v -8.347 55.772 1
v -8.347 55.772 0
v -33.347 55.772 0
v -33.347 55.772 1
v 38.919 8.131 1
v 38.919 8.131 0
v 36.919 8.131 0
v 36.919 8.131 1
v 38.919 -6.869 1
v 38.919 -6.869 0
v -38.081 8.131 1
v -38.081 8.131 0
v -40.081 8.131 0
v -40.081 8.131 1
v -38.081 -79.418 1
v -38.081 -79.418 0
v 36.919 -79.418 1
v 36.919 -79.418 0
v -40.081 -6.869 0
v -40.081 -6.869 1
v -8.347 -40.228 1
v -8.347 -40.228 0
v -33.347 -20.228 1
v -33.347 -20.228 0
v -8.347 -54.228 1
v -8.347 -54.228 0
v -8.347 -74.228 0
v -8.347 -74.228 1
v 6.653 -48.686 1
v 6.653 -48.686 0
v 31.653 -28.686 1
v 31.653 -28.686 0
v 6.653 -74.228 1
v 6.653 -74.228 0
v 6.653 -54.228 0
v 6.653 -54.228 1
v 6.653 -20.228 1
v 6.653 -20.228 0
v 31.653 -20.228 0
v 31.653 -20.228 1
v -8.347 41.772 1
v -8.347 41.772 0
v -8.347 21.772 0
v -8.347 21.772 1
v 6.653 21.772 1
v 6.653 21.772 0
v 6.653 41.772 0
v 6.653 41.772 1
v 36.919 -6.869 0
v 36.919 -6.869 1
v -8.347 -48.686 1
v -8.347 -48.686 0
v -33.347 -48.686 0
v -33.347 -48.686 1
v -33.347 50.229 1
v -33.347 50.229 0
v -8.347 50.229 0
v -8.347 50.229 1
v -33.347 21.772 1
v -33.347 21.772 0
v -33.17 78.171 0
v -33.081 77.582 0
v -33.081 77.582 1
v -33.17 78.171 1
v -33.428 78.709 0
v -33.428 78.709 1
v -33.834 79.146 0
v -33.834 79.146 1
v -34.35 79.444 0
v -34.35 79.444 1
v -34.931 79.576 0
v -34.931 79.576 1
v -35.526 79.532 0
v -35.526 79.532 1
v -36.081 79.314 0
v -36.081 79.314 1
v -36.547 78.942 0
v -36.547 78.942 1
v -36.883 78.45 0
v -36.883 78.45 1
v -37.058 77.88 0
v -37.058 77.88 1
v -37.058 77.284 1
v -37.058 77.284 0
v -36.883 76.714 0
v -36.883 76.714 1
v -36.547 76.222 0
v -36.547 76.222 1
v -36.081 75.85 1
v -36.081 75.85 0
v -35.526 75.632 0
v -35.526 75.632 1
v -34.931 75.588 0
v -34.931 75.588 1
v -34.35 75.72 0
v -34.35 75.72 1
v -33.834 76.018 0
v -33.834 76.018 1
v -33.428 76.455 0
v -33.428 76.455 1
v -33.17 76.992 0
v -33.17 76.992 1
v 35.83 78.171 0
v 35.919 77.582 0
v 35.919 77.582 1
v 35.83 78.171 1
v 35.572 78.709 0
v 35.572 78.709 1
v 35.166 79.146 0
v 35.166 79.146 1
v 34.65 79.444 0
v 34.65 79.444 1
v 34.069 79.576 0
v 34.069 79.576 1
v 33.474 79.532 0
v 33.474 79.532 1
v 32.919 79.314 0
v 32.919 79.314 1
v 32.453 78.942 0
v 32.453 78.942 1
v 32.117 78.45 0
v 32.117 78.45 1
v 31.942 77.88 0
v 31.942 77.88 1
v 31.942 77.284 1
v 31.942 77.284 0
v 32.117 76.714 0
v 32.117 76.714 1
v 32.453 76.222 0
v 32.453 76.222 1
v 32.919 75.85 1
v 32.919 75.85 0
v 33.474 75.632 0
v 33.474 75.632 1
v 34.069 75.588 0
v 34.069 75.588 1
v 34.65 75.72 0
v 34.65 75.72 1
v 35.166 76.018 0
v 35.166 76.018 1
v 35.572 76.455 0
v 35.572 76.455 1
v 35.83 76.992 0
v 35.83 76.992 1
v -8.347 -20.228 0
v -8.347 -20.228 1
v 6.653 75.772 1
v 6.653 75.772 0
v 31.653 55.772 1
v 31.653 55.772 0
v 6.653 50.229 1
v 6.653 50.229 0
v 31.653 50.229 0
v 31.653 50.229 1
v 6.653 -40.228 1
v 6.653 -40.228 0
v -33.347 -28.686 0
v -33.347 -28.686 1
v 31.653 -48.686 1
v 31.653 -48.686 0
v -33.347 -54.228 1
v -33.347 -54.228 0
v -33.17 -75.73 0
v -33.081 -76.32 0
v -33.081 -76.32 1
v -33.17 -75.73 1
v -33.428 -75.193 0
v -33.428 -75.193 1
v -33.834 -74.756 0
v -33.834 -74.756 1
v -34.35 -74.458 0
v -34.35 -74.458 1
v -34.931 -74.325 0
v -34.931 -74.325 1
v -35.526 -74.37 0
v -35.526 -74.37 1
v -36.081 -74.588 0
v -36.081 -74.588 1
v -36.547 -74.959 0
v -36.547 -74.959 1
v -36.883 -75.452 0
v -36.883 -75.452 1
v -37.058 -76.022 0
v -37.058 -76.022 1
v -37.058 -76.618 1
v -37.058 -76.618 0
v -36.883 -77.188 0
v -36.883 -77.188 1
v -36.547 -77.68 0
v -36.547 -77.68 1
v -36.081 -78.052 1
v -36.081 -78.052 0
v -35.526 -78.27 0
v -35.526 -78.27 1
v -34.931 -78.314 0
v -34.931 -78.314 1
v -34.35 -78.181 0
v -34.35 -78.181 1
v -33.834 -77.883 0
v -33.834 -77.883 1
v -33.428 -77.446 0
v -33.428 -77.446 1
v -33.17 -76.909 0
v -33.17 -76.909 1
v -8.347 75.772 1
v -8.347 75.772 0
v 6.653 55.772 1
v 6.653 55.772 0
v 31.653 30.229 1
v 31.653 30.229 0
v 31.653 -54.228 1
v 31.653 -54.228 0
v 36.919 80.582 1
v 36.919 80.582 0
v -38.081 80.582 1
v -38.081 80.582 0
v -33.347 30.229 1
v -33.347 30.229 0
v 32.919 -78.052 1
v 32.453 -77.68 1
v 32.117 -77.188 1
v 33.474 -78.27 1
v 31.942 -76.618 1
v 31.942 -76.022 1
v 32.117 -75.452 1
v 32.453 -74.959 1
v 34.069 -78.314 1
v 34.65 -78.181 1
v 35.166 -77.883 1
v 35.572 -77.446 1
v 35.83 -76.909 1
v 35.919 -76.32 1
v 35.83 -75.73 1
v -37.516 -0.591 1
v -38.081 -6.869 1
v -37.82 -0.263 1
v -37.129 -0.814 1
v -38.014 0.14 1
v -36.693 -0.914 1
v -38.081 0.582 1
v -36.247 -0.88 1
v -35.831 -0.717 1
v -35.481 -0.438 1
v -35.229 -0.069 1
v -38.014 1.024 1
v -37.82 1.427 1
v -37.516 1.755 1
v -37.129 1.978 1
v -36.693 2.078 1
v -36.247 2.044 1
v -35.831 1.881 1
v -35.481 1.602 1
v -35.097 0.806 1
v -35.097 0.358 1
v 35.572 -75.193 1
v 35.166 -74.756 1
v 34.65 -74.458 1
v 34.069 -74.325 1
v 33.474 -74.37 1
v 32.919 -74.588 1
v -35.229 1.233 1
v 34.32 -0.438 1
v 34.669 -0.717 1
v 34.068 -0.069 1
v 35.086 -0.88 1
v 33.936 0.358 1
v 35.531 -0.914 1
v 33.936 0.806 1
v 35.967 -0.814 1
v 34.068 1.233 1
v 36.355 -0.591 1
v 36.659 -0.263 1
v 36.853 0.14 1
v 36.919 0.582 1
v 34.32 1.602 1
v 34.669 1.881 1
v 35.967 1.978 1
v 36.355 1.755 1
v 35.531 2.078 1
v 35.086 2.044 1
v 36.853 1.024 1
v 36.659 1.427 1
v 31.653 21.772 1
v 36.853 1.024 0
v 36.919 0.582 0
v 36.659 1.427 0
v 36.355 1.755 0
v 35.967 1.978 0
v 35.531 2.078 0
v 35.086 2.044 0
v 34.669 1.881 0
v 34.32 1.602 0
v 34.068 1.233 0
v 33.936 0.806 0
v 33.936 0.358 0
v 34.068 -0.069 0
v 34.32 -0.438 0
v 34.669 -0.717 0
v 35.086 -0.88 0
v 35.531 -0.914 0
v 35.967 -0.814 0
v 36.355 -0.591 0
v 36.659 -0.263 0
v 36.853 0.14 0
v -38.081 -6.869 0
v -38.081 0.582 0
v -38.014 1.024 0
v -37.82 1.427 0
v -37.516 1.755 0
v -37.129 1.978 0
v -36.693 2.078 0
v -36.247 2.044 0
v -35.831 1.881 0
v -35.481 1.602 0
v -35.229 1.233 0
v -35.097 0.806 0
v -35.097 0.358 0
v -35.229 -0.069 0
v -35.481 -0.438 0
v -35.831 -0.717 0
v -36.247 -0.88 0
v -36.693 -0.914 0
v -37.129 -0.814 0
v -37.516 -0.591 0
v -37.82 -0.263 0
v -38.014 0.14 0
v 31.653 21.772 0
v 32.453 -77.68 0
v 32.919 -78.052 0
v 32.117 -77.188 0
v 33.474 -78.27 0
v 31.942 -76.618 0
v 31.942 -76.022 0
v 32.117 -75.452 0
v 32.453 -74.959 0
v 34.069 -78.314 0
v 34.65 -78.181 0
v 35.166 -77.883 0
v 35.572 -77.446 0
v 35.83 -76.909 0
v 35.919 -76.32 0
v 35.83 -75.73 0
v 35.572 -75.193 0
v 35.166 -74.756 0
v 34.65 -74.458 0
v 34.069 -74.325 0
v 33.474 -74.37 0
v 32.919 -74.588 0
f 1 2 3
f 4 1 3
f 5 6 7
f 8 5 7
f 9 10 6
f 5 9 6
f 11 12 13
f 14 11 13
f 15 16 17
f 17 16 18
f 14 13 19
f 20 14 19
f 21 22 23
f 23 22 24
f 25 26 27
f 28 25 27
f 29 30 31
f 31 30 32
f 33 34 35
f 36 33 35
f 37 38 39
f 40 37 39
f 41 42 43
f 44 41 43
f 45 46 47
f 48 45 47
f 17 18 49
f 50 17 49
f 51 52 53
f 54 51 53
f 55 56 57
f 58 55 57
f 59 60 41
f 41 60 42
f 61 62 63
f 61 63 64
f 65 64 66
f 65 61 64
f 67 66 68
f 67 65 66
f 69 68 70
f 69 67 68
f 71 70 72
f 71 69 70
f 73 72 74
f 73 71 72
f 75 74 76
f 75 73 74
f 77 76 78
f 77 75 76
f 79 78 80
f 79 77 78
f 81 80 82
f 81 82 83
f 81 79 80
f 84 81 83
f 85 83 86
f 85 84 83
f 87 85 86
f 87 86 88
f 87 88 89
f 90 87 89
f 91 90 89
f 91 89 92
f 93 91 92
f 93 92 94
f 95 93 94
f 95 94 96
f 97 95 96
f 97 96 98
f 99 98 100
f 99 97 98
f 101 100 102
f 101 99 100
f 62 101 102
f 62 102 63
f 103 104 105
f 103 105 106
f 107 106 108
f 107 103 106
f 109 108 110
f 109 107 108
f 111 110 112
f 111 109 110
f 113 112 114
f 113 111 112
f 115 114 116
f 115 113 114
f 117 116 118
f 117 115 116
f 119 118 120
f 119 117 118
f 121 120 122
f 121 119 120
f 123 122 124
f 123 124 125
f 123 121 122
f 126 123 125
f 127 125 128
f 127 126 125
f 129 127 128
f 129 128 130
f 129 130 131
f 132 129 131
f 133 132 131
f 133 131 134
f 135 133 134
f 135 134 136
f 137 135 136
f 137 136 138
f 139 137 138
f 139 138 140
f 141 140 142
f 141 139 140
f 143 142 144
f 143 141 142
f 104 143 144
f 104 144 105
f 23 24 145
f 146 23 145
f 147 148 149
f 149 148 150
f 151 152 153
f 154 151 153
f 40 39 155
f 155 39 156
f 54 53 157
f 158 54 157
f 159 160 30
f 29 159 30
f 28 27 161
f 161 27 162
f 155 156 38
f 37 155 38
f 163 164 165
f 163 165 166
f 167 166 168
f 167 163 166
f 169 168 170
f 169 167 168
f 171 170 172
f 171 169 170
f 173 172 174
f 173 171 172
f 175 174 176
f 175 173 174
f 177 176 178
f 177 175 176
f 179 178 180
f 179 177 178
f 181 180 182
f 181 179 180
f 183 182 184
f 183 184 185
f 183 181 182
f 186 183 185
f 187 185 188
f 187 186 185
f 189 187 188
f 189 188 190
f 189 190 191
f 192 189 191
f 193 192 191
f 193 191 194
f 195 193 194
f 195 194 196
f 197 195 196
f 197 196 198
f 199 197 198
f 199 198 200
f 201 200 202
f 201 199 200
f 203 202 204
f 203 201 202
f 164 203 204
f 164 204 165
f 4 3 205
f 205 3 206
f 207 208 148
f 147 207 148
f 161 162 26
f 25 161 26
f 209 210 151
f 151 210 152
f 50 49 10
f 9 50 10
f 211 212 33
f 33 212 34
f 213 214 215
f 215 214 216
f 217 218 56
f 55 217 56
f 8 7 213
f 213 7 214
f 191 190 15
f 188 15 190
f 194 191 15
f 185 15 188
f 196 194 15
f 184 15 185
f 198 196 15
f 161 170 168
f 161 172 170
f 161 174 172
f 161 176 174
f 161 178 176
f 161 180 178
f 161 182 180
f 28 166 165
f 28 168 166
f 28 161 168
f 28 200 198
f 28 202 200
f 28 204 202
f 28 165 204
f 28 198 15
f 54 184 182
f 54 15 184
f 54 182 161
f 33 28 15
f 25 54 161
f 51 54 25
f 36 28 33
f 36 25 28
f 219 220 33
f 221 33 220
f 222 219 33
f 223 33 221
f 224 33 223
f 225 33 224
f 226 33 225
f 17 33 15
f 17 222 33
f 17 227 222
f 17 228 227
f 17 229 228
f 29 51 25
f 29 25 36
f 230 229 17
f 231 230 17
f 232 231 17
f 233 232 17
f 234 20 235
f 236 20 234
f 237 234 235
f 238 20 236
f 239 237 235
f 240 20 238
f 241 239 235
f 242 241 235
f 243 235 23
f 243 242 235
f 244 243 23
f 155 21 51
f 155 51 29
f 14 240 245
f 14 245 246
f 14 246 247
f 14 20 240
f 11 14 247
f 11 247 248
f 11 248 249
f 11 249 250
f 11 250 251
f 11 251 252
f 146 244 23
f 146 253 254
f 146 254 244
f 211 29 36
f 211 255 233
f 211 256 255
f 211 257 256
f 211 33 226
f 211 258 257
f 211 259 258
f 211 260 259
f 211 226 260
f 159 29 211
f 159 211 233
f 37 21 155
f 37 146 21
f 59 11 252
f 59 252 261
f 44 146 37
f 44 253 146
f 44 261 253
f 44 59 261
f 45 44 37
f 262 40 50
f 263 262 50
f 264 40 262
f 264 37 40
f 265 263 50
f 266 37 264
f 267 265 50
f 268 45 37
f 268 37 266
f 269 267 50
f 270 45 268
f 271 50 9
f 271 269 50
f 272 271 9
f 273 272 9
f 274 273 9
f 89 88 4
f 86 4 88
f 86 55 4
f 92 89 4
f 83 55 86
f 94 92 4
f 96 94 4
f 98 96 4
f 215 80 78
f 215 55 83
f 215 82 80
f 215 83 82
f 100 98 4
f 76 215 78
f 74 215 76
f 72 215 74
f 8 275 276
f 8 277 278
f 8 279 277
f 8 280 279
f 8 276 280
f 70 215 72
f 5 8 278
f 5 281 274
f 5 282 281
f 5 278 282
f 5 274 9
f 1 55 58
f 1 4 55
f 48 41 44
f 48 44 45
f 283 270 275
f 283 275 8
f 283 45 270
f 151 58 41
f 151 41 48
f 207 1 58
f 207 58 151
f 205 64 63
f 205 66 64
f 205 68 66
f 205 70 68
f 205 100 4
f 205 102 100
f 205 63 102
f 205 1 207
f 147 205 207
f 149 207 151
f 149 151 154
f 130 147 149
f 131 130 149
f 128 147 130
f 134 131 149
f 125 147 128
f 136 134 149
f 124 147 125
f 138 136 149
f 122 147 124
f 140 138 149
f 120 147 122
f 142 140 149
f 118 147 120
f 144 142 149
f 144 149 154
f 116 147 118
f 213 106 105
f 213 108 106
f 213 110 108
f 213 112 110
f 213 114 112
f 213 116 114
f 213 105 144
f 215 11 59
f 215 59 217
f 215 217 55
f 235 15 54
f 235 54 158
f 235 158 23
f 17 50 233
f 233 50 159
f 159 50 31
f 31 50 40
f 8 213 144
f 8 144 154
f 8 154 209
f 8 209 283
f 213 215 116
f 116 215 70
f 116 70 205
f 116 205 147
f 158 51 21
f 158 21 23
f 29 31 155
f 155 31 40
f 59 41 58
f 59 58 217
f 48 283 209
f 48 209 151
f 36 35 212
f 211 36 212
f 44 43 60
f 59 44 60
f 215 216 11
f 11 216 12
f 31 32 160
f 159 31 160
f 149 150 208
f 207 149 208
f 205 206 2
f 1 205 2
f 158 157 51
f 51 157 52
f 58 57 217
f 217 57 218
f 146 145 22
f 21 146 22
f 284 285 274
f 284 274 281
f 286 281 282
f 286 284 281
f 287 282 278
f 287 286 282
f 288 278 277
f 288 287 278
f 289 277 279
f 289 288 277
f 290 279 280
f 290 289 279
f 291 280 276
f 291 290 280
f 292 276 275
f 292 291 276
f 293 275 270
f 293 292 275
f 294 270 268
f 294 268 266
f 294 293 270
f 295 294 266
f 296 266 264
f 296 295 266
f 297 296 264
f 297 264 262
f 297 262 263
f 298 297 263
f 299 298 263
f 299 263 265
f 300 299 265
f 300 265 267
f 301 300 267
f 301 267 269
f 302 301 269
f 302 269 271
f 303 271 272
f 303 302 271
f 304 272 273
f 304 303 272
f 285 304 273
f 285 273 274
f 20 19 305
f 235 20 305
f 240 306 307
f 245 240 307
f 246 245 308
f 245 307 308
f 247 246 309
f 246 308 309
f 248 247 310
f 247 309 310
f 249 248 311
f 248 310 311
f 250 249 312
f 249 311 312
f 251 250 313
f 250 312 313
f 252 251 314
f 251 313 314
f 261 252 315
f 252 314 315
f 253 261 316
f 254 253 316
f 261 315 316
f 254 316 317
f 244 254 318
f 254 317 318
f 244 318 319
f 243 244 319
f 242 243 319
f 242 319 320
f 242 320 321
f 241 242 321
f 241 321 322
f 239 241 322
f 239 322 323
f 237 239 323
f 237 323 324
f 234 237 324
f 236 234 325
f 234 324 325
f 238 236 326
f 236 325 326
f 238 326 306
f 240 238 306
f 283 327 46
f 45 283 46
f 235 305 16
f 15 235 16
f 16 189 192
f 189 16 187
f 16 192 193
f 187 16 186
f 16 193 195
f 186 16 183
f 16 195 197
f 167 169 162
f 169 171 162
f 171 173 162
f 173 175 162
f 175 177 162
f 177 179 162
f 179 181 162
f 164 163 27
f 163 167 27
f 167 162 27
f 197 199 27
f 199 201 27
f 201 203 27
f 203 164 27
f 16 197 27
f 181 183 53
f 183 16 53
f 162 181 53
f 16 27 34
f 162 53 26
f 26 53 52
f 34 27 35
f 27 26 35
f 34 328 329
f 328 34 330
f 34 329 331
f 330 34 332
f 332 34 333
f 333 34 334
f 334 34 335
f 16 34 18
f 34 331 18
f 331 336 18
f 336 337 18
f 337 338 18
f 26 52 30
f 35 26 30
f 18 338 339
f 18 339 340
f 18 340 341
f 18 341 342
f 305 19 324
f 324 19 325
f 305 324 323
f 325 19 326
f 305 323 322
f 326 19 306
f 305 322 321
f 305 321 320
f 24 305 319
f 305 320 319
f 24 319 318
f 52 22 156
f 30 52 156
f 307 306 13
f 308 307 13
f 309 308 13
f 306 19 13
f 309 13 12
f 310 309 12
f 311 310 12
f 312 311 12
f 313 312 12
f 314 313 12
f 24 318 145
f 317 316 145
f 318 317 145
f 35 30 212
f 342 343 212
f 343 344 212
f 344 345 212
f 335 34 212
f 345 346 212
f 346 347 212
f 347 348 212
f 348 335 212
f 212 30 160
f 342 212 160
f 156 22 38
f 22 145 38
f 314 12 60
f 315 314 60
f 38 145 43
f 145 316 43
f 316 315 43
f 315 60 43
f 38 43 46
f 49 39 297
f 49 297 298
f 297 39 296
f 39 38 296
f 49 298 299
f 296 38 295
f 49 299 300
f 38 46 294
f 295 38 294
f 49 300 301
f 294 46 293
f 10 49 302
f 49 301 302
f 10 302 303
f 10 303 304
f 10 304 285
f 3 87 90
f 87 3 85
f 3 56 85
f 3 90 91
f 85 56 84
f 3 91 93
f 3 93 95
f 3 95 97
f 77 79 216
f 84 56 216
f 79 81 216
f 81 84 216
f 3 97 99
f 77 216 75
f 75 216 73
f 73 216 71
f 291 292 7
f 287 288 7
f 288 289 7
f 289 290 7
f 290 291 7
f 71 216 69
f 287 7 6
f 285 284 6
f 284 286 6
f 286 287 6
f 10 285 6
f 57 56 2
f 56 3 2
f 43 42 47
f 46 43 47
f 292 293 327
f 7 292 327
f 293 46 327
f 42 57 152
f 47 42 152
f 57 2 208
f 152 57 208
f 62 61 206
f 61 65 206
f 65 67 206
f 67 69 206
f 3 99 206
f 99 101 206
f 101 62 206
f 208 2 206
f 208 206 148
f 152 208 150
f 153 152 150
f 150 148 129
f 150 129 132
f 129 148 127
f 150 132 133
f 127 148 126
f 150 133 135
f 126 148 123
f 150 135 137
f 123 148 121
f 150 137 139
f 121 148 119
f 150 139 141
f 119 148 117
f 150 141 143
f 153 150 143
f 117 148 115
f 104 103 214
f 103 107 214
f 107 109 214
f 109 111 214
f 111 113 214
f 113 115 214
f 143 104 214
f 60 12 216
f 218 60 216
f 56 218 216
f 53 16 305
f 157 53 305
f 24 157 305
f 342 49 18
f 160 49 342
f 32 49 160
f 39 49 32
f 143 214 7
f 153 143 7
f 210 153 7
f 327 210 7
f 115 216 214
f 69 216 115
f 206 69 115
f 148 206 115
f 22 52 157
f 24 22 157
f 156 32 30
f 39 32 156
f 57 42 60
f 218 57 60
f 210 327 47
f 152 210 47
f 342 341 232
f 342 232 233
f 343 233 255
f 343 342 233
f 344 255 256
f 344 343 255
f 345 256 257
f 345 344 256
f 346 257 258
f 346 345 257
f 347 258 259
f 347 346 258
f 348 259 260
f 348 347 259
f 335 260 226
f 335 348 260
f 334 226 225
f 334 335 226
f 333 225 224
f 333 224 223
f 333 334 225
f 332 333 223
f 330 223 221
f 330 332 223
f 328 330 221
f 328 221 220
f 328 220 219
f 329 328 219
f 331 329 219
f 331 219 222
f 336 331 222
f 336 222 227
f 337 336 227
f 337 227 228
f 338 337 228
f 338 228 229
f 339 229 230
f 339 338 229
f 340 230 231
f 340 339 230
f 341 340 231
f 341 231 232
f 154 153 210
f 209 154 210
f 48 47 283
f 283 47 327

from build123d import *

# Parameters (mm, degrees)
F0_R     = 2
F0_R_2   = 1.5
F1_DEPTH = 1


with BuildPart() as f1:
    # F0 (on Top) → F1 (new body)
    with BuildSketch(Plane.XY):
        Polygon((36.9193002582, 80.5819368362), (-38.0806997418, 80.5819368362), (-38.0806997418, 20.6310992315), (-38.0806997418, 15.5746781826), (-38.0806997418, 8.1310992315), (-38.0806997418, 0.5819368409), (-38.0806997418, -6.8689007685), (-38.0806997418, -14.4253218174), (-38.0806997418, -19.3689007685), (-38.0806997418, -79.4180631638), (36.9193002582, -79.4180631638), (36.9193002582, -19.3689007685), (36.9193002582, -14.4253218174), (36.9193002582, -6.8689007685), (36.9193002582, 0.5819368362), (36.9193002582, 8.1310992315), (36.9193002582, 15.5746781826), (36.9193002582, 20.6310992315), align=None)
        with Locations((-35.0806997418, -76.3197383732)):
            Circle(F0_R, mode=Mode.SUBTRACT)
        Polygon((-33.3470307291, -54.2283378169), (-8.3470307291, -54.2283378169), (-8.3470307291, -74.2283378169), align=None, mode=Mode.SUBTRACT)
        Polygon((-33.3470307291, -48.6858622357), (-33.3470307291, -28.6858622357), (-8.3470307291, -48.6858622357), align=None, mode=Mode.SUBTRACT)
        Polygon((-33.3470307291, -20.2283378169), (-8.3470307291, -20.2283378169), (-8.3470307291, -40.2283378169), align=None, mode=Mode.SUBTRACT)
        Polygon((6.6529692709, -74.2283378169), (6.6529692709, -54.2283378169), (31.6529692709, -54.2283378169), align=None, mode=Mode.SUBTRACT)
        with Locations((33.9193002582, -76.3197383732)):
            Circle(F0_R, mode=Mode.SUBTRACT)
        Polygon((31.6529692709, -48.6858622357), (6.6529692709, -48.6858622357), (31.6529692709, -28.6858622357), align=None, mode=Mode.SUBTRACT)
        Polygon((6.6529692709, -40.2283378169), (6.6529692709, -20.2283378169), (31.6529692709, -20.2283378169), align=None, mode=Mode.SUBTRACT)
        with BuildLine():
            ThreePointArc((-35.0806997418, 0.5819368362), (-36.5806997442, -0.9180631638), (-38.0806997418, 0.5819368409))
            ThreePointArc((-38.0806997418, 0.5819368409), (-36.5806997395, 2.0819368362), (-35.0806997418, 0.5819368362))
        make_face(mode=Mode.SUBTRACT)
        Polygon((-8.3470307291, 41.7716621831), (-8.3470307291, 21.7716621831), (-33.3470307291, 21.7716621831), align=None, mode=Mode.SUBTRACT)
        Polygon((-8.3470307291, 50.2291866019), (-33.3470307291, 30.2291866019), (-33.3470307291, 50.2291866019), align=None, mode=Mode.SUBTRACT)
        with Locations((-35.0806997418, 77.5819368362)):
            Circle(F0_R, mode=Mode.SUBTRACT)
        Polygon((-8.3470307291, 55.7716621831), (-33.3470307291, 55.7716621831), (-8.3470307291, 75.7716621831), align=None, mode=Mode.SUBTRACT)
        Polygon((31.6529692709, 21.7716621831), (6.6529692709, 21.7716621831), (6.6529692709, 41.7716621831), align=None, mode=Mode.SUBTRACT)
        Polygon((31.6529692709, 50.2291866019), (31.6529692709, 30.2291866019), (6.6529692709, 50.2291866019), align=None, mode=Mode.SUBTRACT)
        with Locations((35.4193002582, 0.5819368362)):
            Circle(F0_R_2, mode=Mode.SUBTRACT)
        Polygon((31.6529692709, 55.7716621831), (6.6529692709, 55.7716621831), (6.6529692709, 75.7716621831), align=None, mode=Mode.SUBTRACT)
        with Locations((33.9193002582, 77.5819368362)):
            Circle(F0_R, mode=Mode.SUBTRACT)
        Polygon((38.9193002582, 8.1310992315), (36.9193002582, 8.1310992315), (36.9193002582, 0.5819368362), (36.9193002582, -6.8689007685), (38.9193002582, -6.8689007685), (38.9193002582, -4.3689007685), (38.9193002582, 5.6310992315), align=None)
        Polygon((-38.0806997418, 0.5819368409), (-38.0806997418, 8.1310992315), (-40.0806997418, 8.1310992315), (-40.0806997418, 5.6310992315), (-40.0806997418, -4.3689007685), (-40.0806997418, -6.8689007685), (-38.0806997418, -6.8689007685), align=None)
    extrude(amount=F1_DEPTH)


solid = f1.part
